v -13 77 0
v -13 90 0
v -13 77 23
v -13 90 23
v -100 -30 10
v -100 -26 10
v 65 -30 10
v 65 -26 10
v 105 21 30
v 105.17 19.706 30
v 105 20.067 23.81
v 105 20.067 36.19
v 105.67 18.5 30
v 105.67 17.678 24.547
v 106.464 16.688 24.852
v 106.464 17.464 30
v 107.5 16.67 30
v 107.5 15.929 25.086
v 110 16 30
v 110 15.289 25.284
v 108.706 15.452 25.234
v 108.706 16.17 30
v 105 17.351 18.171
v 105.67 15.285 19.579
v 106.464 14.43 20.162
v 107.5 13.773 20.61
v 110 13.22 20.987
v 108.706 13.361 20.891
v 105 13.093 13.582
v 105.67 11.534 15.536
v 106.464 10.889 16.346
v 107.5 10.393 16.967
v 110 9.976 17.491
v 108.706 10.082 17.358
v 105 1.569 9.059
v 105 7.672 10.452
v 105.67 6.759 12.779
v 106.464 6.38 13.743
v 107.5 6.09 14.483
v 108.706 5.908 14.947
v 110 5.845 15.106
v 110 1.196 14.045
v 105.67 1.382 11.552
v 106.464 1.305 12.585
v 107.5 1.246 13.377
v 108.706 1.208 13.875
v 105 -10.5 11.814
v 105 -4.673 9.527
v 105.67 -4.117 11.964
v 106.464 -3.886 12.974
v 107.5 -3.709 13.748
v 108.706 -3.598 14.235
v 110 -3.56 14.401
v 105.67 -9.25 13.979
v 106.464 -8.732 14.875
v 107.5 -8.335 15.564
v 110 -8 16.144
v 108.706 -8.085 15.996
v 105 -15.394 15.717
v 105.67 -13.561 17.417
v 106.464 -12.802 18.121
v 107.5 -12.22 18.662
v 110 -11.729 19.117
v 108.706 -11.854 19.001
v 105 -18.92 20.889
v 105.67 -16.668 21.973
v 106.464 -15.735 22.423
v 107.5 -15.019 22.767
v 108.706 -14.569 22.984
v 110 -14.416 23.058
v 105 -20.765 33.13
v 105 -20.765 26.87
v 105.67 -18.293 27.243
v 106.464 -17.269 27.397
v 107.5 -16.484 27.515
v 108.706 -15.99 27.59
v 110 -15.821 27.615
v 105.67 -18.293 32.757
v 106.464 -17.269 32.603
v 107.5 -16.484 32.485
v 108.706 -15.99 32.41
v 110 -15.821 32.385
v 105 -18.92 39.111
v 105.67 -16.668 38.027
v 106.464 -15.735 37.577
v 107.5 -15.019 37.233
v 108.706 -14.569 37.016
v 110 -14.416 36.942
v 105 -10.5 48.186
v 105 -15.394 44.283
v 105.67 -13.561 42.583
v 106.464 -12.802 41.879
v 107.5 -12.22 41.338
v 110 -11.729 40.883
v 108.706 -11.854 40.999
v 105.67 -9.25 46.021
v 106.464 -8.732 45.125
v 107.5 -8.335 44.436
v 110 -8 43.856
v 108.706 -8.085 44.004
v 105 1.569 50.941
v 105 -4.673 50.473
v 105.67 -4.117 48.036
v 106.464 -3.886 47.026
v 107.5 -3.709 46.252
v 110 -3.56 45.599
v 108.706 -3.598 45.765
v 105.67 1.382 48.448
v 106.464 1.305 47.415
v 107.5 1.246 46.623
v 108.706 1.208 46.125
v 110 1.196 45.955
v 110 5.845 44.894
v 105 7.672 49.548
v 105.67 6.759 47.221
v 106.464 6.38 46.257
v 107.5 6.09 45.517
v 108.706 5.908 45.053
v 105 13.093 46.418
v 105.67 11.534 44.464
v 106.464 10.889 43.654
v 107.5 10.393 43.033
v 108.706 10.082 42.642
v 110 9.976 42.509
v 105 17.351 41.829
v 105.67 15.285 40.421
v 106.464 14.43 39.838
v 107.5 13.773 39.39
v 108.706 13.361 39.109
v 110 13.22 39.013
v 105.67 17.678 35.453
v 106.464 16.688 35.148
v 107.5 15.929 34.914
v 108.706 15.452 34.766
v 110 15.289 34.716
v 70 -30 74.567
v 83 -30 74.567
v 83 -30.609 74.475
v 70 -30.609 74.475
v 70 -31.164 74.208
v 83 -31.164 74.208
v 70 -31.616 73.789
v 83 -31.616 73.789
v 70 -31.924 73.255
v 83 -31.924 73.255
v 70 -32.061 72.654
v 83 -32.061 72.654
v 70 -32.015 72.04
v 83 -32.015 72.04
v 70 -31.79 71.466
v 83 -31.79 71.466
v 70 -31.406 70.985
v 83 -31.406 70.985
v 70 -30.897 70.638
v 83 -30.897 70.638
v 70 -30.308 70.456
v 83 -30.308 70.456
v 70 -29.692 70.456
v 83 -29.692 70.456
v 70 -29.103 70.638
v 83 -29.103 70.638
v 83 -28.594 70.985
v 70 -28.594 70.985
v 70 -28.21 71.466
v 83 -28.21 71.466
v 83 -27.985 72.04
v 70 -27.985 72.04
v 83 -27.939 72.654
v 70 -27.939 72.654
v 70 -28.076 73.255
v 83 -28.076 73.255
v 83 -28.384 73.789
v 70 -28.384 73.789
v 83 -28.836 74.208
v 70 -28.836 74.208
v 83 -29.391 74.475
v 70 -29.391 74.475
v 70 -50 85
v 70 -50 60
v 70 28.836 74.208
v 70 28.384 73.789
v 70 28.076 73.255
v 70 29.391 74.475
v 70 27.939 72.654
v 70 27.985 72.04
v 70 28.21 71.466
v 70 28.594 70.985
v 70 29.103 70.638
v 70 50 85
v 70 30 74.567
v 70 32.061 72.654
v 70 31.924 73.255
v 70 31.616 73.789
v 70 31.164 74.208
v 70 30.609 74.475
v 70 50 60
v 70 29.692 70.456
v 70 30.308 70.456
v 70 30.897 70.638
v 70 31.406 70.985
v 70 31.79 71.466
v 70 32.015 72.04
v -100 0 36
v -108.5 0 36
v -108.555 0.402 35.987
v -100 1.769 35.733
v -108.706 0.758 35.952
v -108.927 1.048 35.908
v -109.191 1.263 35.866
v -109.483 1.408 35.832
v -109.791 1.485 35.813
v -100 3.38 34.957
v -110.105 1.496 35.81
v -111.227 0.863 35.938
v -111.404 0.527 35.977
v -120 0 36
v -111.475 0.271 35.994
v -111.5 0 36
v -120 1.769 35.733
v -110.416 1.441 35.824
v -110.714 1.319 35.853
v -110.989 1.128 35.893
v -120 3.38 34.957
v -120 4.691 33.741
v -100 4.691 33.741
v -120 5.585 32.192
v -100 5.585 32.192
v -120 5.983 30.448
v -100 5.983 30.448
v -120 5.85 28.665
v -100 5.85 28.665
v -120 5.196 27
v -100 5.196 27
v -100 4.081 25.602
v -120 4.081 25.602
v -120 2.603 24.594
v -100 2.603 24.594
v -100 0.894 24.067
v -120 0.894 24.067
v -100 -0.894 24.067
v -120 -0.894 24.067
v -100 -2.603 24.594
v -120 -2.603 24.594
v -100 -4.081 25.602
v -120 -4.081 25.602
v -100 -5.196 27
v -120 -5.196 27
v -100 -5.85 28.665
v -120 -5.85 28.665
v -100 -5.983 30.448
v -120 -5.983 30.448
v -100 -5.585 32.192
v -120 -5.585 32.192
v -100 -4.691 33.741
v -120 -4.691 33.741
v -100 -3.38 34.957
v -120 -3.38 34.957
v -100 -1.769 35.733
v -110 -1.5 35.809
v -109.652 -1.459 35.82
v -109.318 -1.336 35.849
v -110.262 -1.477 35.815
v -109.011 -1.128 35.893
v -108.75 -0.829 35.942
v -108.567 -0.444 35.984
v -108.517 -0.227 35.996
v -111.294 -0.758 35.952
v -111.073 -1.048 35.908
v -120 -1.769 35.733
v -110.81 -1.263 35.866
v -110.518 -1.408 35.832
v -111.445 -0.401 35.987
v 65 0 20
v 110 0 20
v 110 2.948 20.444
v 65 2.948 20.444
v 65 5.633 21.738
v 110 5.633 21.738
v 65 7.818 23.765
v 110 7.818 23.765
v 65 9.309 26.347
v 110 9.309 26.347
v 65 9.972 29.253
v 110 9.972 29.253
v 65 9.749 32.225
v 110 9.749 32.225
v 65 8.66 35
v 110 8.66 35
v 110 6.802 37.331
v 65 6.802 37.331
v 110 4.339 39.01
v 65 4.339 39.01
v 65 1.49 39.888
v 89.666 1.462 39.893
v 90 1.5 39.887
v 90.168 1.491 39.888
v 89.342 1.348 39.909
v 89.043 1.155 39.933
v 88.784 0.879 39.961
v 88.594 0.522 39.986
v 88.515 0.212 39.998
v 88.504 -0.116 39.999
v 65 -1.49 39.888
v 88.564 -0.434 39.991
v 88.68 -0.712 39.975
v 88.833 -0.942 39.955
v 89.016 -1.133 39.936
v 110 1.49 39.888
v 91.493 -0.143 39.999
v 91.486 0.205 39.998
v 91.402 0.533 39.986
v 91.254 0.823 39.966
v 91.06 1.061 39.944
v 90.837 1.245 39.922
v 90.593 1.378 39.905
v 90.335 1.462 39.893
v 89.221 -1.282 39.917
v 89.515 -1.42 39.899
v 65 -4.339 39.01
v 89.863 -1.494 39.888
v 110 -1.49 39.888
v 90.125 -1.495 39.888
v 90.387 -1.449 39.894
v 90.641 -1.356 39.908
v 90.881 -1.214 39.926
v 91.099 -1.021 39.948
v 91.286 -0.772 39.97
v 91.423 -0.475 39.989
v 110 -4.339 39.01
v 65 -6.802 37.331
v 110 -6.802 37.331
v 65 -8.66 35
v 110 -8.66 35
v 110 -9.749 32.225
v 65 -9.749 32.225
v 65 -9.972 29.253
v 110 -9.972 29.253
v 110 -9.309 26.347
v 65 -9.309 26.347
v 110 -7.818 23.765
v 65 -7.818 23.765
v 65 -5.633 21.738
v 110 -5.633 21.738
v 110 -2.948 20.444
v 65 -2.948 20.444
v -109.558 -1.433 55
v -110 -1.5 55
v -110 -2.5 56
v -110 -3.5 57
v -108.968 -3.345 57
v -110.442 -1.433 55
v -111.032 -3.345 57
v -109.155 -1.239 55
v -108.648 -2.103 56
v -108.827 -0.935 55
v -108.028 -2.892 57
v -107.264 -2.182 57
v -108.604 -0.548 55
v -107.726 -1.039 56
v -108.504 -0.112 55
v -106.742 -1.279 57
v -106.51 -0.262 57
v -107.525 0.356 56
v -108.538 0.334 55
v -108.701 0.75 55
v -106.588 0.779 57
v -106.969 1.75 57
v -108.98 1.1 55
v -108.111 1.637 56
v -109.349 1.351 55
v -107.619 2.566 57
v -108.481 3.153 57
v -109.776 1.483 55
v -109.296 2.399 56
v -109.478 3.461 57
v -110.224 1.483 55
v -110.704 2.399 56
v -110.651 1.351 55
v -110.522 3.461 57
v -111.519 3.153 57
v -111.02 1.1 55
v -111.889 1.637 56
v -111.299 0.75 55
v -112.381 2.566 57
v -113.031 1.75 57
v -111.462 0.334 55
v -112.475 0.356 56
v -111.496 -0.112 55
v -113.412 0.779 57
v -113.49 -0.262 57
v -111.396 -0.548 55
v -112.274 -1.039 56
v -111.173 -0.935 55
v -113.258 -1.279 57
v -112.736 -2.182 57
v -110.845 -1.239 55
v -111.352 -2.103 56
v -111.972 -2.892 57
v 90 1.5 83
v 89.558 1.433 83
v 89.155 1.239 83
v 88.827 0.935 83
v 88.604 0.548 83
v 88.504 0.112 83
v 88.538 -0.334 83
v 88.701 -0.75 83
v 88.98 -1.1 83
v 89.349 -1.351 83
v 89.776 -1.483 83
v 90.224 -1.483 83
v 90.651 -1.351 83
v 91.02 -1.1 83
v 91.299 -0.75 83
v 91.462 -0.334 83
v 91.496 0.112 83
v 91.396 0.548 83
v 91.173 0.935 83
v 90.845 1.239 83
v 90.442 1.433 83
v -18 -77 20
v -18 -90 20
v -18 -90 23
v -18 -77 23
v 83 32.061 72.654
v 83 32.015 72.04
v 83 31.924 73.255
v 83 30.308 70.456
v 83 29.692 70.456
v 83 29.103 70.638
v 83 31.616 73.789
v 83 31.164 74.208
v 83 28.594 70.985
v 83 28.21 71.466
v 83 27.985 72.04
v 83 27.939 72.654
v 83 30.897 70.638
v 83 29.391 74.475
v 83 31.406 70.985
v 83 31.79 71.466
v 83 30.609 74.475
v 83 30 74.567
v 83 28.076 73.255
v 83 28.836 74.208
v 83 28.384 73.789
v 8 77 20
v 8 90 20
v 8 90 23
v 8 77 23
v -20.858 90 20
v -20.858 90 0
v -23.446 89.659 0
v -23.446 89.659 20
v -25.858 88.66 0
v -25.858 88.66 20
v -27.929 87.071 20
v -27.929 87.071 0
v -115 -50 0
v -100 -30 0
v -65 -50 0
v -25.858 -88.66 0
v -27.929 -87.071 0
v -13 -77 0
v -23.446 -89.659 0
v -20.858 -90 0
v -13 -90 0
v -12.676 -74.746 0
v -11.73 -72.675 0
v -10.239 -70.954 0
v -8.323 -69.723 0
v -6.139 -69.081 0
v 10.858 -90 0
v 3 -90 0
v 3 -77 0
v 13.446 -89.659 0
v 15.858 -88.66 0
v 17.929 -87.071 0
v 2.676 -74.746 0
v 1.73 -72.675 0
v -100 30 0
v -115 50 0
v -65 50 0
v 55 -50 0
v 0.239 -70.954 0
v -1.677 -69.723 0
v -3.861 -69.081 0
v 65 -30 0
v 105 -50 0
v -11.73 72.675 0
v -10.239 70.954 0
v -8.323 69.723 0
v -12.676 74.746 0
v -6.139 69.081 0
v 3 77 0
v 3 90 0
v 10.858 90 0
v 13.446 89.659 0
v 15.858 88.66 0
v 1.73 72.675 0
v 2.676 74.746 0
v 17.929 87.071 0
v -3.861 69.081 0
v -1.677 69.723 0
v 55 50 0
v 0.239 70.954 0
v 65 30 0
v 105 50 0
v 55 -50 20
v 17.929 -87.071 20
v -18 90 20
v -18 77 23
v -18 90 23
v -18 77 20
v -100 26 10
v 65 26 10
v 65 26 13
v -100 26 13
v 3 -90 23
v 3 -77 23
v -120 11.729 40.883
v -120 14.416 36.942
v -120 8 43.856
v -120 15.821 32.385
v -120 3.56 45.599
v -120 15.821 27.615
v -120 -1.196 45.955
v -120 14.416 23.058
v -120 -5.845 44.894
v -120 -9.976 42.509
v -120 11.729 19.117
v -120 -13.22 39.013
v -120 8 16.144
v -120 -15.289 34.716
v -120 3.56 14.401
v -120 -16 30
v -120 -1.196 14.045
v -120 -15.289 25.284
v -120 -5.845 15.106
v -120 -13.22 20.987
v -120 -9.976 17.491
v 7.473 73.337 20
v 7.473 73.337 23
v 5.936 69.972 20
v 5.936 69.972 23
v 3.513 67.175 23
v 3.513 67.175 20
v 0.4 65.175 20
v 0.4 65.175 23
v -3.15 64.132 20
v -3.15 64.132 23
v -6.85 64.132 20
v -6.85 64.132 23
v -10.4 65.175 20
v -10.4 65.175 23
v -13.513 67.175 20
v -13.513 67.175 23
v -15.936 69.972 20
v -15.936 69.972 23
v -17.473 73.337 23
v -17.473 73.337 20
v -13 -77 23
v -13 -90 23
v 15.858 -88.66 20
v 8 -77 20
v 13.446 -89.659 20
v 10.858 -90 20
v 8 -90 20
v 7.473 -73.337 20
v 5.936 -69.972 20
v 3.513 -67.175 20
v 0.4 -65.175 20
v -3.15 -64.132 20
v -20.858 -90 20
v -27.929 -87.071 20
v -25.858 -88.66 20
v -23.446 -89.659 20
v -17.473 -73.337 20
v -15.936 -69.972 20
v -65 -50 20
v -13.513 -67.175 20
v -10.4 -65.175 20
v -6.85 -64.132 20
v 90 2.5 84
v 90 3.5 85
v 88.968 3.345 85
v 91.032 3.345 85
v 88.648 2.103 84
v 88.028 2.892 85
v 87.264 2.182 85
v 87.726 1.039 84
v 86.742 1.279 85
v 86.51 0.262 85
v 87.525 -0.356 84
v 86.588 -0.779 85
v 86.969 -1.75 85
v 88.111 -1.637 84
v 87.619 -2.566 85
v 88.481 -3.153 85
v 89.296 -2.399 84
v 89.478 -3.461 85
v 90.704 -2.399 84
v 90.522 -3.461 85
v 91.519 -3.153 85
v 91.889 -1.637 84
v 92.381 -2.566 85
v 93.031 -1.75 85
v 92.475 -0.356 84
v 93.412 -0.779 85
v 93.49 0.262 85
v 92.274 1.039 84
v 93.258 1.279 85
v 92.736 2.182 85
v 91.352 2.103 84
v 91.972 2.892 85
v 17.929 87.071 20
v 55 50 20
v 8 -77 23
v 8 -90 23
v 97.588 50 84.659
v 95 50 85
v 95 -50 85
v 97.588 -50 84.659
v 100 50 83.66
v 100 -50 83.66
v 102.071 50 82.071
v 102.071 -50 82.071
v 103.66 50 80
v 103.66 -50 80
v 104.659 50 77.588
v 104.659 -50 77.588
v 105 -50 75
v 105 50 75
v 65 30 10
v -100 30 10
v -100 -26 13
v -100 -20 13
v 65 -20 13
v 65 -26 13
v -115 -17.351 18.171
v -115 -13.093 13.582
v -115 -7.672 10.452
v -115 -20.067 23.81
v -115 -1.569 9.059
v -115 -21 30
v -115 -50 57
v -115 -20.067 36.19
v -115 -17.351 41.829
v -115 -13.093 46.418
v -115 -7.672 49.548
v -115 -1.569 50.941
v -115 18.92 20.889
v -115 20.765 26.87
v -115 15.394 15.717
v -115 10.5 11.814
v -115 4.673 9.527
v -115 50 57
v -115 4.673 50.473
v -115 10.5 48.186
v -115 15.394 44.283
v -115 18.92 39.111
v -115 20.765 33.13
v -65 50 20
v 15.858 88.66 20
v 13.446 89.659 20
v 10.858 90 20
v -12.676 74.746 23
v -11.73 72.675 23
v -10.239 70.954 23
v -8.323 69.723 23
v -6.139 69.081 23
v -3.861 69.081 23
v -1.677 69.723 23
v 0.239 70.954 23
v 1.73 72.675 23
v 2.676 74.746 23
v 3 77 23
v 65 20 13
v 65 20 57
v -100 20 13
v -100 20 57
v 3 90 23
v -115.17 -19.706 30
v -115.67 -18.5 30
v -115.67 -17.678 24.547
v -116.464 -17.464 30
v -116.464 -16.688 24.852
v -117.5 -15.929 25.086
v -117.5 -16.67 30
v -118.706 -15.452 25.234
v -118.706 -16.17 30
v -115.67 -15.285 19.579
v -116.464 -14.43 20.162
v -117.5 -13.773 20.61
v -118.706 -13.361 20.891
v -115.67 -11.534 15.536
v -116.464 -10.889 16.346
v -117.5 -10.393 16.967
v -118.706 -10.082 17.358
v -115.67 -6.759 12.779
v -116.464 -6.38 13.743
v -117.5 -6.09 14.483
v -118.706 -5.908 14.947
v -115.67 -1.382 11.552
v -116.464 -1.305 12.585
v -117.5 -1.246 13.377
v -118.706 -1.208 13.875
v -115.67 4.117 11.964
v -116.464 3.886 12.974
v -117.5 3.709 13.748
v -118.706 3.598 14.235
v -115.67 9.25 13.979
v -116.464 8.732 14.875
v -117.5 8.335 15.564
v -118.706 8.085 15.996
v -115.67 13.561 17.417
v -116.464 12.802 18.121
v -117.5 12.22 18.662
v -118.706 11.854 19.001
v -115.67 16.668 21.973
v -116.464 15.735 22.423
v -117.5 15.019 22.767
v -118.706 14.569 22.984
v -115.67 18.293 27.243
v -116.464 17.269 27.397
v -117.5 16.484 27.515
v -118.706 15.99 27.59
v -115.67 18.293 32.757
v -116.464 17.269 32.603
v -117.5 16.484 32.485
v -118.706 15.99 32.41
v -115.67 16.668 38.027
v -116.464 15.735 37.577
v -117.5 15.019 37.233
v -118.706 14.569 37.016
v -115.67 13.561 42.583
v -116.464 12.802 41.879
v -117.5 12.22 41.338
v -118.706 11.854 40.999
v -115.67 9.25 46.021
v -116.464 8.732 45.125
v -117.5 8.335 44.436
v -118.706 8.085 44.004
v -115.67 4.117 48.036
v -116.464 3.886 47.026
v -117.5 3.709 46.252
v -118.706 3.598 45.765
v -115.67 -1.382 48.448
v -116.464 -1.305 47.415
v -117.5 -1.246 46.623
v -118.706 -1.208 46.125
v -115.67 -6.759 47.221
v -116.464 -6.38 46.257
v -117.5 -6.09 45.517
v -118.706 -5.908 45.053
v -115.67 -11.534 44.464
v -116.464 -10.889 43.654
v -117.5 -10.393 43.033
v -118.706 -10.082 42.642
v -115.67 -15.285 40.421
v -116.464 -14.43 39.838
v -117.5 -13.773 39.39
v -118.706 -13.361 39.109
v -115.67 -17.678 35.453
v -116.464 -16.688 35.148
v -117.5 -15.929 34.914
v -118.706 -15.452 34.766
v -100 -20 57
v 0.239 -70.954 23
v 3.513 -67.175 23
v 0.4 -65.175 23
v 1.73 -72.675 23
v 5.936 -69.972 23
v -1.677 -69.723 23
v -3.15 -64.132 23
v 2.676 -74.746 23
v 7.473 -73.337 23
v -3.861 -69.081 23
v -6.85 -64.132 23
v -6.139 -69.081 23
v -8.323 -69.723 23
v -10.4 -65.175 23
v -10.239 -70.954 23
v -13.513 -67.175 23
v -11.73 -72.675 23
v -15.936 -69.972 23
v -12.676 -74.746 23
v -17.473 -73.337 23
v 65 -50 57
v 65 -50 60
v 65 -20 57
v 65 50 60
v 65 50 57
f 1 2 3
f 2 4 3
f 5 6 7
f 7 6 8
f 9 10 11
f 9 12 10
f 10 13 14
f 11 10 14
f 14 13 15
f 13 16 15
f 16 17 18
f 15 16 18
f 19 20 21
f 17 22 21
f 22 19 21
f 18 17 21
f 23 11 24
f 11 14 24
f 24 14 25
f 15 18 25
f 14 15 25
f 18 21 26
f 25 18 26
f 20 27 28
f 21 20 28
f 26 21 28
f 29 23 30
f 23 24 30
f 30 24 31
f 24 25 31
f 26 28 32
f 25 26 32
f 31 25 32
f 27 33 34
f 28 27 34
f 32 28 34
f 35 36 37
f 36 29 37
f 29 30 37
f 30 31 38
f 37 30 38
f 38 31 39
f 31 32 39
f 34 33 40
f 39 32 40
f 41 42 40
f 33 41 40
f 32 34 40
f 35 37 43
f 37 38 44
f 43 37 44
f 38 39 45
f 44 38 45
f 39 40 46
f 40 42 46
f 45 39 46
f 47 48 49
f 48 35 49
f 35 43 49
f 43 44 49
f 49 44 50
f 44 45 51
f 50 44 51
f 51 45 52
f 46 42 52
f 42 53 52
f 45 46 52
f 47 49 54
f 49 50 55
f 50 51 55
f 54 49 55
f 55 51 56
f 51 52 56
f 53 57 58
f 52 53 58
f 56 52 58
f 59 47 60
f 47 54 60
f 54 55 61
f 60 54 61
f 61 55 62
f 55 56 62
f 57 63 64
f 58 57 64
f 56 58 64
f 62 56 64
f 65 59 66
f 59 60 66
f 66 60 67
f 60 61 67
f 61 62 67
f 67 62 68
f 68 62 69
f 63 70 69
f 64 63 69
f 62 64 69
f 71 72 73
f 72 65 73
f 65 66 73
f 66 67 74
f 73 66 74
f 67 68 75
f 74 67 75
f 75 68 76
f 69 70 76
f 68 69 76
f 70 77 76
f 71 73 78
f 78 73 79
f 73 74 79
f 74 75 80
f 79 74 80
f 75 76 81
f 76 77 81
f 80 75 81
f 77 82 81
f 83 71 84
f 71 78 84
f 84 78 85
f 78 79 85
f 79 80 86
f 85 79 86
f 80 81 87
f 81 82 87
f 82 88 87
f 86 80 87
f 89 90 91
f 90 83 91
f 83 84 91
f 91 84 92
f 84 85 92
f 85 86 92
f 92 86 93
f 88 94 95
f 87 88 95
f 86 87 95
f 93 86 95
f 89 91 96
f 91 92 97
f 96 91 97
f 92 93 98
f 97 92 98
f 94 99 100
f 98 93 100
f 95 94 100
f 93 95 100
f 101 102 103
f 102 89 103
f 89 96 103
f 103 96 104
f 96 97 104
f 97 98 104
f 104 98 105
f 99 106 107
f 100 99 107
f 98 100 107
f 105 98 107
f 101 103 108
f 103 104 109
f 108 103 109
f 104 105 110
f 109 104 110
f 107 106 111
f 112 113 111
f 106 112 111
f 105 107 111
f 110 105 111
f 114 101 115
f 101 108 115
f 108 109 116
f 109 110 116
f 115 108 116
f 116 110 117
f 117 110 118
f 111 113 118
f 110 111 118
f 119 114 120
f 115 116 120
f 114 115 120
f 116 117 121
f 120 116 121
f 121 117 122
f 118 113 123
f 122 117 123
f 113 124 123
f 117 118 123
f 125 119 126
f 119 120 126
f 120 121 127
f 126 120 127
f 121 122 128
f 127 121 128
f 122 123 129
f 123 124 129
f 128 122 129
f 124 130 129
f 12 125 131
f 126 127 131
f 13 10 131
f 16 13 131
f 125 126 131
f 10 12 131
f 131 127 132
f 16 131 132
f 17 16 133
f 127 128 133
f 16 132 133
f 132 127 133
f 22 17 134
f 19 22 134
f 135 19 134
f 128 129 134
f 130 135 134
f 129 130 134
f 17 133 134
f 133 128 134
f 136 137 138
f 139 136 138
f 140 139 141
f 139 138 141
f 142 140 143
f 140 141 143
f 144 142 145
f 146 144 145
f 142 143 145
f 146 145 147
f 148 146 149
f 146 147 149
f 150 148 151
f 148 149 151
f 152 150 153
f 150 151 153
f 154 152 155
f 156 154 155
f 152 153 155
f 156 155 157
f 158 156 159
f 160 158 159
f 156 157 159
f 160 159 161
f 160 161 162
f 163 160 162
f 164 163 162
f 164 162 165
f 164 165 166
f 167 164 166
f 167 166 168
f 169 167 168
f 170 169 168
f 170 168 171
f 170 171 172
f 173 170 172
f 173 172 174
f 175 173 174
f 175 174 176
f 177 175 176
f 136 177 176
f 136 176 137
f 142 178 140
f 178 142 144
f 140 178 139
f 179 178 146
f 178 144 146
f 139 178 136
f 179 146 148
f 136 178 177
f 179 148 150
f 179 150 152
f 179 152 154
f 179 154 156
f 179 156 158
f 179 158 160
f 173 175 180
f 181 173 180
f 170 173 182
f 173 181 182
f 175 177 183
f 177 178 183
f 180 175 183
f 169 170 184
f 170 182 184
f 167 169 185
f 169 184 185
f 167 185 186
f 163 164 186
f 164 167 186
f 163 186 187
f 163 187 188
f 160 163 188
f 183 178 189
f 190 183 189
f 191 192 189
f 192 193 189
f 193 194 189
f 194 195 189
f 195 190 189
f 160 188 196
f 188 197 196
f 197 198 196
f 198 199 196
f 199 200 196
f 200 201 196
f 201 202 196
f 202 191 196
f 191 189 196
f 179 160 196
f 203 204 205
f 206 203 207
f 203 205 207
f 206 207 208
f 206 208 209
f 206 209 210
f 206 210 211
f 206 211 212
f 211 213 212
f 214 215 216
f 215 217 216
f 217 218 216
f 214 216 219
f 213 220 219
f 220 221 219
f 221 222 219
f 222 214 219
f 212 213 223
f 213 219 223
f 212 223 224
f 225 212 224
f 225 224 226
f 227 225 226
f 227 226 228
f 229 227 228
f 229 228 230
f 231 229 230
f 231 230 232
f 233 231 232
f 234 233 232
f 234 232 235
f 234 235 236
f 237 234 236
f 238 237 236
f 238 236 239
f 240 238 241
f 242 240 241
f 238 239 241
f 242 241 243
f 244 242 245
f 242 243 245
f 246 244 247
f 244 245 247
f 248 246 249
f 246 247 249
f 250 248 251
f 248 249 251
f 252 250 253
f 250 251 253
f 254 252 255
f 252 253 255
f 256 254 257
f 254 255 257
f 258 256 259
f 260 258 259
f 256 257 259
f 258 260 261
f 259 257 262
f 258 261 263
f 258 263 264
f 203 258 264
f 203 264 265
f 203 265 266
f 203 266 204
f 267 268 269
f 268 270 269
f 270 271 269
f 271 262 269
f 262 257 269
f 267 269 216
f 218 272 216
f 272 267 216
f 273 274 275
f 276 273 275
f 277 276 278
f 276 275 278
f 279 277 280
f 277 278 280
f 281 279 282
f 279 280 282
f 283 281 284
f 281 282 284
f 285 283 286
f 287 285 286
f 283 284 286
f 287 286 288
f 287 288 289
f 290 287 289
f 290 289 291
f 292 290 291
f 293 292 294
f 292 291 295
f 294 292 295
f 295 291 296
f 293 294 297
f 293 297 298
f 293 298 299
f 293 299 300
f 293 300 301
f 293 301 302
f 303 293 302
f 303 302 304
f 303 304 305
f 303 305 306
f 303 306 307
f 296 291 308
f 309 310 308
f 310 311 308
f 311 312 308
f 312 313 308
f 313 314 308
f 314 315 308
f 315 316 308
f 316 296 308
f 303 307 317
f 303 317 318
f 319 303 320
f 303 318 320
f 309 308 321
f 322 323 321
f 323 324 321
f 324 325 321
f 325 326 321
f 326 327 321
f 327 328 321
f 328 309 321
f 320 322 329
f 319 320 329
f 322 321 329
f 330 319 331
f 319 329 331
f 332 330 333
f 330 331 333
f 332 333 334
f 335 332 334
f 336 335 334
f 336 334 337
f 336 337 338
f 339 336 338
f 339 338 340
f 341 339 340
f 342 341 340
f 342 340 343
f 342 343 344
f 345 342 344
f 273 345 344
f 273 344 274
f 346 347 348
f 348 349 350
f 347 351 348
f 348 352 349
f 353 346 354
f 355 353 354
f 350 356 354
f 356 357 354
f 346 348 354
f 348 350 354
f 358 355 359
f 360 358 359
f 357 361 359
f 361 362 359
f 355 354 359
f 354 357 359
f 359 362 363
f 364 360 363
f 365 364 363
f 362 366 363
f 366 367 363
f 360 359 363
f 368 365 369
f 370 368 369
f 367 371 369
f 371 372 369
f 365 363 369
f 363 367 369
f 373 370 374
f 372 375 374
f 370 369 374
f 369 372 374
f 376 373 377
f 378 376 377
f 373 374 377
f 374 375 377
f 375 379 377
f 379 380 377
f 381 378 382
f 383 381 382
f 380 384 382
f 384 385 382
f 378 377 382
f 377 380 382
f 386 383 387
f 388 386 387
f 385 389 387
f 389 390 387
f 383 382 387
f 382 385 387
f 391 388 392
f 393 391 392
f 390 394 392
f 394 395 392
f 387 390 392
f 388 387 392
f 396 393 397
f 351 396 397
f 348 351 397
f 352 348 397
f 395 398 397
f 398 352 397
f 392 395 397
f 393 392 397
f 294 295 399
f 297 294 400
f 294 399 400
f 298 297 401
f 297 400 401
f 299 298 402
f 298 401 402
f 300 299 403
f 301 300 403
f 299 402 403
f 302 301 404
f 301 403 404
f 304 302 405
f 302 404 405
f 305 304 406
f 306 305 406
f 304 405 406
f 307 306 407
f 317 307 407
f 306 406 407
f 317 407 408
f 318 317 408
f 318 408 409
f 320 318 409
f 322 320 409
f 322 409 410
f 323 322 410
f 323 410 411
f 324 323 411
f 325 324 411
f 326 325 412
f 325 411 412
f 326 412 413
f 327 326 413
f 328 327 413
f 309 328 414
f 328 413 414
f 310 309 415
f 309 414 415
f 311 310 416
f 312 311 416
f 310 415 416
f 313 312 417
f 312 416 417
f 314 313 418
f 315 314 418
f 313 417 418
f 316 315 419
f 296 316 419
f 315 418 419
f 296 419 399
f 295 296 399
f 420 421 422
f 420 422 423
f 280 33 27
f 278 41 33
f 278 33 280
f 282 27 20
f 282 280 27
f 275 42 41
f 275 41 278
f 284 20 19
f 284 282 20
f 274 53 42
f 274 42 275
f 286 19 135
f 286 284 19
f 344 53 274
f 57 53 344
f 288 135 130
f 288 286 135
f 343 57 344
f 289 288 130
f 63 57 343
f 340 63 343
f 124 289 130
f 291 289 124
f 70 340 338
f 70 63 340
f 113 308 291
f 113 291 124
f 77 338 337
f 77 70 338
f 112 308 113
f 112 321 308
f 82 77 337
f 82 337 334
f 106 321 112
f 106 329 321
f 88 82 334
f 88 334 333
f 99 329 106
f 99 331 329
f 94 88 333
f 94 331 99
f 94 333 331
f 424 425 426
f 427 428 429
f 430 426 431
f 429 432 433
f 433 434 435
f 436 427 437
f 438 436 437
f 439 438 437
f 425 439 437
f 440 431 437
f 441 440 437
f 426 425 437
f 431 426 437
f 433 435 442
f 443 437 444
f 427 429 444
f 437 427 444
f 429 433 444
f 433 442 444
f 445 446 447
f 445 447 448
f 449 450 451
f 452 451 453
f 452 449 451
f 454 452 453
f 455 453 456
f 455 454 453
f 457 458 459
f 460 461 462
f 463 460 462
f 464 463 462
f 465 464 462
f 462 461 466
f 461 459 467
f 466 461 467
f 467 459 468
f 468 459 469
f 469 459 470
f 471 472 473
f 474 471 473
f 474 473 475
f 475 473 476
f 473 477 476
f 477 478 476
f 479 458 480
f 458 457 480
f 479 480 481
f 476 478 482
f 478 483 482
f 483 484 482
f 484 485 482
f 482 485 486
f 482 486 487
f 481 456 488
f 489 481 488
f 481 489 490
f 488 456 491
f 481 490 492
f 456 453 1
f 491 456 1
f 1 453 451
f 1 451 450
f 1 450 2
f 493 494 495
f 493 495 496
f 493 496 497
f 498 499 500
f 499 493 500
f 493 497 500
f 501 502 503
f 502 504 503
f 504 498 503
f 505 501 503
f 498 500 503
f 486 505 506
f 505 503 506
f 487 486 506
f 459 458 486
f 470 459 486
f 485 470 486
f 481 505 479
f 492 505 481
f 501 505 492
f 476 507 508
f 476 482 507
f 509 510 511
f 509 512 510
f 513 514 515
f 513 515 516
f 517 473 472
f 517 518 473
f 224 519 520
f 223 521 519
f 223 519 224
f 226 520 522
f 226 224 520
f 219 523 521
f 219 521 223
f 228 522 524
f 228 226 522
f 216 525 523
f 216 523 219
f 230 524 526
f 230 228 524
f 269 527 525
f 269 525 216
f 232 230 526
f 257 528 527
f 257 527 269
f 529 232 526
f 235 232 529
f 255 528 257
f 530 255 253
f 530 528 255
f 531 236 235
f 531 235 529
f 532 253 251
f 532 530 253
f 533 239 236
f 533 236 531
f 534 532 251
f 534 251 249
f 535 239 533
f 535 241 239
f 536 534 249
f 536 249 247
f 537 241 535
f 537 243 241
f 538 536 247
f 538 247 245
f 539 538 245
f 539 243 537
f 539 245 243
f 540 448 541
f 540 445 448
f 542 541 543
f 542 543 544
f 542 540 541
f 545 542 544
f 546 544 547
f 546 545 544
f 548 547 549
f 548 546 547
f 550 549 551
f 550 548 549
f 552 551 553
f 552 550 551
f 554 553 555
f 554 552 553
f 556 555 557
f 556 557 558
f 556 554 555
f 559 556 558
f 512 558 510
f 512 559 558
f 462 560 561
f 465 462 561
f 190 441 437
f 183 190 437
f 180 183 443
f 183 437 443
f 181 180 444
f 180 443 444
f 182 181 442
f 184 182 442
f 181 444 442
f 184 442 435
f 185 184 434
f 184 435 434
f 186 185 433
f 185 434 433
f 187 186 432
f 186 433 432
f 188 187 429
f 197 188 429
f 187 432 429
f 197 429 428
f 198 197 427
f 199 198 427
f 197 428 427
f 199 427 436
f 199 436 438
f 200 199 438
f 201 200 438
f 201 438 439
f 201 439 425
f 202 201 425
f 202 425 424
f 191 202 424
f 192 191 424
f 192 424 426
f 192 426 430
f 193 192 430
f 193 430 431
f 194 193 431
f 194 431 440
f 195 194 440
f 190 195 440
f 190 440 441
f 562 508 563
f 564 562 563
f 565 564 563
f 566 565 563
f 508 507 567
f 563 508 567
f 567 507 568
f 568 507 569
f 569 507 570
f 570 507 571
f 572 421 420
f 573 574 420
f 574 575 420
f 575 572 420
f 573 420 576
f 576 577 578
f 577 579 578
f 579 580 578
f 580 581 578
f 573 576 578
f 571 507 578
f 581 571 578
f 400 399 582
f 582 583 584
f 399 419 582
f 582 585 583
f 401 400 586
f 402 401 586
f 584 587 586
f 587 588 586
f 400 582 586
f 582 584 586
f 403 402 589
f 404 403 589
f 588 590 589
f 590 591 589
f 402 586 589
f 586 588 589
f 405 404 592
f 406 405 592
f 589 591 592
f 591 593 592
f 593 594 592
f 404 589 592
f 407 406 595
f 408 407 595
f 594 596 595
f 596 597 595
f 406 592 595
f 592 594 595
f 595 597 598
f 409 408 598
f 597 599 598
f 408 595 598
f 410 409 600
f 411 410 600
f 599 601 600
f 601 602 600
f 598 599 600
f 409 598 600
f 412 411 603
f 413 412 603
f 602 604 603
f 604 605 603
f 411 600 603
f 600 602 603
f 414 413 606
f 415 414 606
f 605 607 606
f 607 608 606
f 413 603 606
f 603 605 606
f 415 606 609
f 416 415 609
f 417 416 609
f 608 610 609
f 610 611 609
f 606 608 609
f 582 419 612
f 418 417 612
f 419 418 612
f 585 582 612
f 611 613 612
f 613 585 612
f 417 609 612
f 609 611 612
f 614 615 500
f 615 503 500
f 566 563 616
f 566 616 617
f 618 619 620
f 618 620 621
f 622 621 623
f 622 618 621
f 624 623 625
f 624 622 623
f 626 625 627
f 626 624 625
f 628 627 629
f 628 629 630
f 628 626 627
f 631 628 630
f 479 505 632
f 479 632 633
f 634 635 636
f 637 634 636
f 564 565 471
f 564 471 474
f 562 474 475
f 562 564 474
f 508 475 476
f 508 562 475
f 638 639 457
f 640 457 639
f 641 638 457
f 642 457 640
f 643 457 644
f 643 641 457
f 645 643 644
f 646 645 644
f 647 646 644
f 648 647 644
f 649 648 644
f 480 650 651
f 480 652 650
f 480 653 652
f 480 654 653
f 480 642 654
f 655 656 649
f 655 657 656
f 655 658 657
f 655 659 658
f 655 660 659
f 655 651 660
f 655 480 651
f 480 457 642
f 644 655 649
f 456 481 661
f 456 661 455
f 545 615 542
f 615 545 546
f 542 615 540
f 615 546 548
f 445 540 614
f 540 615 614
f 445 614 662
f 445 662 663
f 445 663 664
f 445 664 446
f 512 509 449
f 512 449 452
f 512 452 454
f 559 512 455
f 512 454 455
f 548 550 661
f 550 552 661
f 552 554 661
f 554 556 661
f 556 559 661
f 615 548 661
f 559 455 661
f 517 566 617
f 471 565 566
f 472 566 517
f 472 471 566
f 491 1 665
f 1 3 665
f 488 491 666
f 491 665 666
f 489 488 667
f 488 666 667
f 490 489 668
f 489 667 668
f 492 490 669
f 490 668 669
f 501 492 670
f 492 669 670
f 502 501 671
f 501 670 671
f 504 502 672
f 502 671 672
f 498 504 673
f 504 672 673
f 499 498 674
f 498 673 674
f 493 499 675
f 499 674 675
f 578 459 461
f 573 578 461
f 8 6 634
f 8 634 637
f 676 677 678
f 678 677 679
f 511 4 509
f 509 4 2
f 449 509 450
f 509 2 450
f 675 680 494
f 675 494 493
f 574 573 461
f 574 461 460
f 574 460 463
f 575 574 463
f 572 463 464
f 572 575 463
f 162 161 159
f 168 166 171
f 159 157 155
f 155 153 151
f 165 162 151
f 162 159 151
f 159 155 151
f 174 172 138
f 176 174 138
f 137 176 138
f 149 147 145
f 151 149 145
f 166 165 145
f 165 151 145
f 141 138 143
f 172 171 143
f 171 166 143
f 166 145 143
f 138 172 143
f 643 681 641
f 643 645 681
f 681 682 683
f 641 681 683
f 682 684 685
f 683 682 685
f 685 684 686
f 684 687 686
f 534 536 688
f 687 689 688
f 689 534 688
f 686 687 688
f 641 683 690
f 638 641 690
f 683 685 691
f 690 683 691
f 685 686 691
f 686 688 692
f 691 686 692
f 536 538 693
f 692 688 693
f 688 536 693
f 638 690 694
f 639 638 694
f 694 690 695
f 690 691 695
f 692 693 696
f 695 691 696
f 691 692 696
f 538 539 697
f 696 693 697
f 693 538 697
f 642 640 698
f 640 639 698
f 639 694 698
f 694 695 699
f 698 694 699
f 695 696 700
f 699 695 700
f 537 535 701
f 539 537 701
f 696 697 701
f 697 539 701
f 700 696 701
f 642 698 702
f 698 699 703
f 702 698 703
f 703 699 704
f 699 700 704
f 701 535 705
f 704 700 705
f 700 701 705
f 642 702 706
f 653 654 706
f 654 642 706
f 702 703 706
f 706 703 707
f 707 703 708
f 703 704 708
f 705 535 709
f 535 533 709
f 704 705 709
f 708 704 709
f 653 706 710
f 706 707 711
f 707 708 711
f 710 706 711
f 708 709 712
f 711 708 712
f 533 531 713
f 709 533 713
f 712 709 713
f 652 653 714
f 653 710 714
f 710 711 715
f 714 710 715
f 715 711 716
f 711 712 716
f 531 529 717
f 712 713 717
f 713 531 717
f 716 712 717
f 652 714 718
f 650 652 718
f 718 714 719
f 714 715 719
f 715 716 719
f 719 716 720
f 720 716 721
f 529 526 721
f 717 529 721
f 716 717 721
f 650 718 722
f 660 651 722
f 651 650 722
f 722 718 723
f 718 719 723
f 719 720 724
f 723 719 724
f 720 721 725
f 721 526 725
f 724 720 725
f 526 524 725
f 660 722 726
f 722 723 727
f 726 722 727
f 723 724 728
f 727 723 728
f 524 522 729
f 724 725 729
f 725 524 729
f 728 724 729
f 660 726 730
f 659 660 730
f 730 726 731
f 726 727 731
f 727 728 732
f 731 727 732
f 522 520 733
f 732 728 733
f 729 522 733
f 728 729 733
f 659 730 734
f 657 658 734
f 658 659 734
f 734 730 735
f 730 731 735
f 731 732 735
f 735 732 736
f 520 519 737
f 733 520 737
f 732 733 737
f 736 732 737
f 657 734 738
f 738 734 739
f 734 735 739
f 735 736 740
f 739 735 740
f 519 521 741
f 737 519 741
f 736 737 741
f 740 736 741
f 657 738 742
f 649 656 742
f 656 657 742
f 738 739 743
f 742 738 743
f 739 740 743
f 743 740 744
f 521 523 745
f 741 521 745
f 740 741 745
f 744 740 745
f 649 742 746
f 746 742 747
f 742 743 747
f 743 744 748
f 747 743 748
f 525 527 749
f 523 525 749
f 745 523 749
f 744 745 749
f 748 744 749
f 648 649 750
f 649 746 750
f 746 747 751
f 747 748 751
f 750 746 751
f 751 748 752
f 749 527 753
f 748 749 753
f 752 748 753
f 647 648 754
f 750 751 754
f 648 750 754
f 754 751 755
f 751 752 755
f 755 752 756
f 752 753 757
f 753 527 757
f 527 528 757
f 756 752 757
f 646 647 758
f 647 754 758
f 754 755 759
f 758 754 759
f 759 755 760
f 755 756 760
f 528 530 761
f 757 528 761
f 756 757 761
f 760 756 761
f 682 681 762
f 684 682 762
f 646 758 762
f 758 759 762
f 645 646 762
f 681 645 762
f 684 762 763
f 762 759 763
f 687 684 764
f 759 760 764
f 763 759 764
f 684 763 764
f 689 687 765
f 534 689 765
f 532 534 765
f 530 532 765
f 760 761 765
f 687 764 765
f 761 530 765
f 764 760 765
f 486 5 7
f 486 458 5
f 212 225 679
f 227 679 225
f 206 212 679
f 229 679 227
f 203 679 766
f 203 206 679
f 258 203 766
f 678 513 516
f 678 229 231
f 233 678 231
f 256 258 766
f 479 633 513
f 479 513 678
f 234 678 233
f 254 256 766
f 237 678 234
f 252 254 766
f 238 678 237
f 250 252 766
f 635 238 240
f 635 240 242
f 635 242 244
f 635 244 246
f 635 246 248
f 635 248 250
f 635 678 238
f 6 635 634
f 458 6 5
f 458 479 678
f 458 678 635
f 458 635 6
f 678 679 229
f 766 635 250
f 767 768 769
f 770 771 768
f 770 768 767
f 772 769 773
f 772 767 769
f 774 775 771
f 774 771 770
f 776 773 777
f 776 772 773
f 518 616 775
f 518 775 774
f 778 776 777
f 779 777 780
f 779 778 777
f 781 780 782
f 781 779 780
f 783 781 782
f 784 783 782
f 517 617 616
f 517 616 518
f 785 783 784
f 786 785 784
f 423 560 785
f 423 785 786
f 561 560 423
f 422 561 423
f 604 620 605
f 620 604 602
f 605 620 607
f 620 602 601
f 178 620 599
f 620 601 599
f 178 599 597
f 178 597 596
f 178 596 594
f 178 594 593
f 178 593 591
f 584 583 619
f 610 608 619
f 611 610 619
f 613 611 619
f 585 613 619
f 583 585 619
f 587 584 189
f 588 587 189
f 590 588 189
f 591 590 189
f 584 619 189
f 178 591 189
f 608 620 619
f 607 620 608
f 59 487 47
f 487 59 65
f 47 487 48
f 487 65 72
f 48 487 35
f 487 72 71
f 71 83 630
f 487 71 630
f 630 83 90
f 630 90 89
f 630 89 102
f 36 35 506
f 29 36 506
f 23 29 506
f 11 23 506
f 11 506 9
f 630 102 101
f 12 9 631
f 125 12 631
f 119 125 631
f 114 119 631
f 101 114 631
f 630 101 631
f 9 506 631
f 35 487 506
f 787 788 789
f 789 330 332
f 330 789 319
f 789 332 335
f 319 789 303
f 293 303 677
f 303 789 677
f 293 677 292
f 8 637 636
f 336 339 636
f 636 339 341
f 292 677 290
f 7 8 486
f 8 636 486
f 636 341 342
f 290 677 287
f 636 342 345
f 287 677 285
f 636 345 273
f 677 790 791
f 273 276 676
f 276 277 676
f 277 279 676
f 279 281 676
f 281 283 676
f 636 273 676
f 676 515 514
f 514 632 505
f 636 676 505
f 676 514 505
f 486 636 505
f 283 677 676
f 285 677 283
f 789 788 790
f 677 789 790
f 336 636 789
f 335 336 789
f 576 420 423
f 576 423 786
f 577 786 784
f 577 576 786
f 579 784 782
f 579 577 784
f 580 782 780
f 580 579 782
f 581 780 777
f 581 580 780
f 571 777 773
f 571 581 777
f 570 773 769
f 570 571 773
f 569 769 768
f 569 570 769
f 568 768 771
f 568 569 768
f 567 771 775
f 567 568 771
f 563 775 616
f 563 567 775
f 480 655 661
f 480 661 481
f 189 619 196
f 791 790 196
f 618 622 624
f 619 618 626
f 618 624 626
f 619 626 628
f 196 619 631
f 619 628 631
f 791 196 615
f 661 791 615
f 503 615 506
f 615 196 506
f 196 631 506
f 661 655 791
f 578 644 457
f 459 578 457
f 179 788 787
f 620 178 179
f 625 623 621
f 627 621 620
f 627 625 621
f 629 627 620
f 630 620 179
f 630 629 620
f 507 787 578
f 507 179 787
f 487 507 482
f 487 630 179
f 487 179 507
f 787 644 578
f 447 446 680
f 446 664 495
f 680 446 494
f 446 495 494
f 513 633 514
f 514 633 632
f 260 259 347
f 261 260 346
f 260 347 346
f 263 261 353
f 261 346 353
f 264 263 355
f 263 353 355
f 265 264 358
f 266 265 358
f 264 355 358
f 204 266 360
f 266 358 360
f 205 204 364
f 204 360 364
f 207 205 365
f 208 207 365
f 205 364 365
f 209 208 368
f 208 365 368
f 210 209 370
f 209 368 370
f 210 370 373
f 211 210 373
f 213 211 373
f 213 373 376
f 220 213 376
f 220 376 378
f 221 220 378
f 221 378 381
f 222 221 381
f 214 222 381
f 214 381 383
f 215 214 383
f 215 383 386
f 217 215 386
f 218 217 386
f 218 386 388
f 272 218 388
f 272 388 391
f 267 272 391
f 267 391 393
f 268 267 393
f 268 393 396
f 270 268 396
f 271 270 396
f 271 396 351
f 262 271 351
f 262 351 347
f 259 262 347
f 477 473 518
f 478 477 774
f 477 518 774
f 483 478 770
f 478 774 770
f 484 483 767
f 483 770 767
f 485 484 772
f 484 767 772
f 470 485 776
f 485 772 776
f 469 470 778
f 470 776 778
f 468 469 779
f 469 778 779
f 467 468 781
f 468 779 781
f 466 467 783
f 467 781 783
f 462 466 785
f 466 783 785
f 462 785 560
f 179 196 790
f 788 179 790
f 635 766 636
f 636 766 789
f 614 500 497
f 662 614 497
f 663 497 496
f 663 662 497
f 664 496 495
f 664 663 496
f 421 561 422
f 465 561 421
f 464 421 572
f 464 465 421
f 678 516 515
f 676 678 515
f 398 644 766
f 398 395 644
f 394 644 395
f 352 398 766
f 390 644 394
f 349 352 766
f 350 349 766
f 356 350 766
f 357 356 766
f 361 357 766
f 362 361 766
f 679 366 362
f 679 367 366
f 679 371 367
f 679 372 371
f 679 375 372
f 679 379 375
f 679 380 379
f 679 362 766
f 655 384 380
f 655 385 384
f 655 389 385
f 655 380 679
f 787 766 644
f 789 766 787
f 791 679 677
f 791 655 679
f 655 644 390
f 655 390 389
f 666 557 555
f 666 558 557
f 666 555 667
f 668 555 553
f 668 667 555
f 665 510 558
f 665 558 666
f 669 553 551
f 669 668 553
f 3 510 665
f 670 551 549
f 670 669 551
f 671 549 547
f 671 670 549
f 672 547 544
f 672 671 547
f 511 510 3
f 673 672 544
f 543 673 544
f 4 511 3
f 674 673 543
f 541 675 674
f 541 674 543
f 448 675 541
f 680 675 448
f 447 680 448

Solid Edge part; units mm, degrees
sketch "Sketch1" plane through (0, 0, 0) normal (0, -1, 0) x (1, 0, 0)
  line L0 (105, 85) -> (70, 85)
  line L1 (70, 85) -> (70, 60)
  line L2 (70, 60) -> (65, 60)
  line L3 (65, 60) -> (65, 57)
  line L4 (-115, 57) -> (65, 57)
  line L5 (-115, 0) -> (-115, 57)
  line L6 (-115, 0) -> (105, 0)
  line L7 (105, 0) -> (105, 85)
extrude "Protrusion1" add sketch "Sketch1" along normal mid plane 100
fillet "Round_1" radius 10 1 edges at (105, 0, 85)
sketch "Sketch2" plane through (105, 0, 37.5) normal (1, 0, 0) x (0, 1, 0)
  circle A0 centre (0, -7.5) radius 16
extrude "ExtrudedProtrusion_2" add sketch "Sketch2" along normal blind 5 and the other way blind 121.5371
sketch "Sketch3" plane through (-115, 0, 28.5) normal (-1, 0, 0) x (0, -1, 0)
  circle A0 centre (0, 1.5) radius 16
extrude "ExtrudedProtrusion_4" add sketch "Sketch3" along normal blind 5 and the other way blind 41.3803
sketch "Sketch4" plane through (-25, 0, 57) normal (0, 0, 1) x (0, 1, 0)
  line L0 (-20, 75) -> (-20, -90)
  line L1 (-20, -90) -> (20, -90)
  line L2 (20, -90) -> (20, 75)
  line L3 (20, 75) -> (-20, 75)
extrude "ExtrudedCutout_1" cut sketch "Sketch4" against normal blind 96.6335 and the other way blind 62.4355
hole "Hole_1" at (-120, 0, 30) direction (1, 0, 0) diameter 12 end up to next
hole "Hole_2" at (110, 0, 30) direction (-1, 0, 0) diameter 20 end up to next
sketch "Sketch5" plane through (-5, 0, 0) normal (0, 0, -1) x (1, 0, 0)
  line L0 (-95, 30) -> (70, 30)
  line L1 (70, 30) -> (70, -30)
  line L2 (70, -30) -> (-95, -30)
  line L3 (-95, -30) -> (-95, 30)
extrude "ExtrudedCutout_2" cut sketch "Sketch5" against normal blind 10 and the other way blind 12.0852
sketch "Sketch6" plane through (-5, 0, 0) normal (0, 0, -1) x (1, 0, 0)
  line L0 (-95, 26) -> (70, 26)
  line L1 (70, 26) -> (70, -26)
  line L2 (70, -26) -> (-95, -26)
  line L3 (-95, -26) -> (-95, 26)
extrude "ExtrudedCutout_3" cut sketch "Sketch6" against normal blind 13 and the other way blind 22.4029
hole "Hole_3" at (70, 30, 72.5) direction (1, 0, 0) diameter 4.134 depth 13 thread major 5 thread length 10
hole "Hole1" at (70, -30, 72.5) direction (1, 0, 0) diameter 4.134 depth 13 thread major 5 thread length 10
sketch "Sketch7" plane through (82.5, 0, 85) normal (0, 0, 1) x (0, 1, 0)
  circle A0 centre (0, -7.5) radius 1.5
extrude "ExtrudedCutout_7" cut sketch "Sketch7" against normal up to next and the other way blind 53.7029
chamfer "Chamfer_5" distance 2 angle 45 1 edges at (90, -1.5, 85)
sketch "Sketch8" plane through (-25, 0, 57) normal (0, 0, 1) x (0, -1, 0)
  circle A0 centre (0, -85) radius 1.5
extrude "ExtrudedCutout_8" cut sketch "Sketch8" against normal up to next and the other way blind 4.3365
chamfer "Chamfer_6" distance 2 angle 45 1 edges at (-110, 1.5, 57)
fillet "Round_4" radius 5 1 edges at (105, -16, 30)
fillet "Round_5" radius 5 1 edges at (-115, 16, 30)
sketch "Sketch9" plane through (0, 0, 0) normal (0, 0, 1) x (1, 0, 0)
  line L0 (-5, -90) -> (-25, -90)
  line L1 (-65, -50) -> (-25, -90)
  line L2 (-5, -50) -> (-65, -50)
  line L3 (-5, -50) -> (55, -50)
  line L4 (55, -50) -> (15, -90)
  line L5 (-5, -90) -> (15, -90)
  line L6 (-65, 50) -> (-25, 90)
  line L7 (-5, 90) -> (-25, 90)
  line L8 (-5, 90) -> (15, 90)
  line L9 (55, 50) -> (15, 90)
  line L10 (-5, 50) -> (55, 50)
  line L11 (-5, 50) -> (-65, 50)
extrude "ExtrudedProtrusion_5" add sketch "Sketch9" along normal blind 20
fillet "Round_7" radius 10 4 edges at (-25, -90, 10) (15, -90, 10) (-25, 90, 10) (15, 90, 10)
sketch "Sketch10" plane through (0, 0, 0) normal (0, 0, 1) x (1, 0, 0)
  line L0 (3, 90) -> (3, 77)
  arc A0 (-13, 77) -> (3, 77) centre (-5, 77) ccw
  line L1 (-13, 90) -> (-13, 77)
  line L2 (-18, 90) -> (-13, 90)
  line L3 (-18, 77) -> (-18, 90)
  arc A1 (8, 77) -> (-18, 77) centre (-5, 77) cw
  line L4 (8, 90) -> (8, 77)
  line L5 (3, 90) -> (8, 90)
extrude "ExtrudedProtrusion_7" add sketch "Sketch10" along normal blind 23
sketch "Sketch11" plane through (-5, 79.5, 20) normal (0, 0, 1) x (-1, 0, 0)
  line L0 (-8, -10.5) -> (8, -10.5)
  line L1 (8, -10.5) -> (8, 2.5)
  arc A0 (-8, 2.5) -> (8, 2.5) centre (0, 2.5) cw
  line L2 (-8, -10.5) -> (-8, 2.5)
extrude "Cutout1" cut sketch "Sketch11" against normal through all
mirror "Mirror1" about plane through (0, 0, 0) normal (0, -1, 0) of "ExtrudedProtrusion_7", "Cutout1"
